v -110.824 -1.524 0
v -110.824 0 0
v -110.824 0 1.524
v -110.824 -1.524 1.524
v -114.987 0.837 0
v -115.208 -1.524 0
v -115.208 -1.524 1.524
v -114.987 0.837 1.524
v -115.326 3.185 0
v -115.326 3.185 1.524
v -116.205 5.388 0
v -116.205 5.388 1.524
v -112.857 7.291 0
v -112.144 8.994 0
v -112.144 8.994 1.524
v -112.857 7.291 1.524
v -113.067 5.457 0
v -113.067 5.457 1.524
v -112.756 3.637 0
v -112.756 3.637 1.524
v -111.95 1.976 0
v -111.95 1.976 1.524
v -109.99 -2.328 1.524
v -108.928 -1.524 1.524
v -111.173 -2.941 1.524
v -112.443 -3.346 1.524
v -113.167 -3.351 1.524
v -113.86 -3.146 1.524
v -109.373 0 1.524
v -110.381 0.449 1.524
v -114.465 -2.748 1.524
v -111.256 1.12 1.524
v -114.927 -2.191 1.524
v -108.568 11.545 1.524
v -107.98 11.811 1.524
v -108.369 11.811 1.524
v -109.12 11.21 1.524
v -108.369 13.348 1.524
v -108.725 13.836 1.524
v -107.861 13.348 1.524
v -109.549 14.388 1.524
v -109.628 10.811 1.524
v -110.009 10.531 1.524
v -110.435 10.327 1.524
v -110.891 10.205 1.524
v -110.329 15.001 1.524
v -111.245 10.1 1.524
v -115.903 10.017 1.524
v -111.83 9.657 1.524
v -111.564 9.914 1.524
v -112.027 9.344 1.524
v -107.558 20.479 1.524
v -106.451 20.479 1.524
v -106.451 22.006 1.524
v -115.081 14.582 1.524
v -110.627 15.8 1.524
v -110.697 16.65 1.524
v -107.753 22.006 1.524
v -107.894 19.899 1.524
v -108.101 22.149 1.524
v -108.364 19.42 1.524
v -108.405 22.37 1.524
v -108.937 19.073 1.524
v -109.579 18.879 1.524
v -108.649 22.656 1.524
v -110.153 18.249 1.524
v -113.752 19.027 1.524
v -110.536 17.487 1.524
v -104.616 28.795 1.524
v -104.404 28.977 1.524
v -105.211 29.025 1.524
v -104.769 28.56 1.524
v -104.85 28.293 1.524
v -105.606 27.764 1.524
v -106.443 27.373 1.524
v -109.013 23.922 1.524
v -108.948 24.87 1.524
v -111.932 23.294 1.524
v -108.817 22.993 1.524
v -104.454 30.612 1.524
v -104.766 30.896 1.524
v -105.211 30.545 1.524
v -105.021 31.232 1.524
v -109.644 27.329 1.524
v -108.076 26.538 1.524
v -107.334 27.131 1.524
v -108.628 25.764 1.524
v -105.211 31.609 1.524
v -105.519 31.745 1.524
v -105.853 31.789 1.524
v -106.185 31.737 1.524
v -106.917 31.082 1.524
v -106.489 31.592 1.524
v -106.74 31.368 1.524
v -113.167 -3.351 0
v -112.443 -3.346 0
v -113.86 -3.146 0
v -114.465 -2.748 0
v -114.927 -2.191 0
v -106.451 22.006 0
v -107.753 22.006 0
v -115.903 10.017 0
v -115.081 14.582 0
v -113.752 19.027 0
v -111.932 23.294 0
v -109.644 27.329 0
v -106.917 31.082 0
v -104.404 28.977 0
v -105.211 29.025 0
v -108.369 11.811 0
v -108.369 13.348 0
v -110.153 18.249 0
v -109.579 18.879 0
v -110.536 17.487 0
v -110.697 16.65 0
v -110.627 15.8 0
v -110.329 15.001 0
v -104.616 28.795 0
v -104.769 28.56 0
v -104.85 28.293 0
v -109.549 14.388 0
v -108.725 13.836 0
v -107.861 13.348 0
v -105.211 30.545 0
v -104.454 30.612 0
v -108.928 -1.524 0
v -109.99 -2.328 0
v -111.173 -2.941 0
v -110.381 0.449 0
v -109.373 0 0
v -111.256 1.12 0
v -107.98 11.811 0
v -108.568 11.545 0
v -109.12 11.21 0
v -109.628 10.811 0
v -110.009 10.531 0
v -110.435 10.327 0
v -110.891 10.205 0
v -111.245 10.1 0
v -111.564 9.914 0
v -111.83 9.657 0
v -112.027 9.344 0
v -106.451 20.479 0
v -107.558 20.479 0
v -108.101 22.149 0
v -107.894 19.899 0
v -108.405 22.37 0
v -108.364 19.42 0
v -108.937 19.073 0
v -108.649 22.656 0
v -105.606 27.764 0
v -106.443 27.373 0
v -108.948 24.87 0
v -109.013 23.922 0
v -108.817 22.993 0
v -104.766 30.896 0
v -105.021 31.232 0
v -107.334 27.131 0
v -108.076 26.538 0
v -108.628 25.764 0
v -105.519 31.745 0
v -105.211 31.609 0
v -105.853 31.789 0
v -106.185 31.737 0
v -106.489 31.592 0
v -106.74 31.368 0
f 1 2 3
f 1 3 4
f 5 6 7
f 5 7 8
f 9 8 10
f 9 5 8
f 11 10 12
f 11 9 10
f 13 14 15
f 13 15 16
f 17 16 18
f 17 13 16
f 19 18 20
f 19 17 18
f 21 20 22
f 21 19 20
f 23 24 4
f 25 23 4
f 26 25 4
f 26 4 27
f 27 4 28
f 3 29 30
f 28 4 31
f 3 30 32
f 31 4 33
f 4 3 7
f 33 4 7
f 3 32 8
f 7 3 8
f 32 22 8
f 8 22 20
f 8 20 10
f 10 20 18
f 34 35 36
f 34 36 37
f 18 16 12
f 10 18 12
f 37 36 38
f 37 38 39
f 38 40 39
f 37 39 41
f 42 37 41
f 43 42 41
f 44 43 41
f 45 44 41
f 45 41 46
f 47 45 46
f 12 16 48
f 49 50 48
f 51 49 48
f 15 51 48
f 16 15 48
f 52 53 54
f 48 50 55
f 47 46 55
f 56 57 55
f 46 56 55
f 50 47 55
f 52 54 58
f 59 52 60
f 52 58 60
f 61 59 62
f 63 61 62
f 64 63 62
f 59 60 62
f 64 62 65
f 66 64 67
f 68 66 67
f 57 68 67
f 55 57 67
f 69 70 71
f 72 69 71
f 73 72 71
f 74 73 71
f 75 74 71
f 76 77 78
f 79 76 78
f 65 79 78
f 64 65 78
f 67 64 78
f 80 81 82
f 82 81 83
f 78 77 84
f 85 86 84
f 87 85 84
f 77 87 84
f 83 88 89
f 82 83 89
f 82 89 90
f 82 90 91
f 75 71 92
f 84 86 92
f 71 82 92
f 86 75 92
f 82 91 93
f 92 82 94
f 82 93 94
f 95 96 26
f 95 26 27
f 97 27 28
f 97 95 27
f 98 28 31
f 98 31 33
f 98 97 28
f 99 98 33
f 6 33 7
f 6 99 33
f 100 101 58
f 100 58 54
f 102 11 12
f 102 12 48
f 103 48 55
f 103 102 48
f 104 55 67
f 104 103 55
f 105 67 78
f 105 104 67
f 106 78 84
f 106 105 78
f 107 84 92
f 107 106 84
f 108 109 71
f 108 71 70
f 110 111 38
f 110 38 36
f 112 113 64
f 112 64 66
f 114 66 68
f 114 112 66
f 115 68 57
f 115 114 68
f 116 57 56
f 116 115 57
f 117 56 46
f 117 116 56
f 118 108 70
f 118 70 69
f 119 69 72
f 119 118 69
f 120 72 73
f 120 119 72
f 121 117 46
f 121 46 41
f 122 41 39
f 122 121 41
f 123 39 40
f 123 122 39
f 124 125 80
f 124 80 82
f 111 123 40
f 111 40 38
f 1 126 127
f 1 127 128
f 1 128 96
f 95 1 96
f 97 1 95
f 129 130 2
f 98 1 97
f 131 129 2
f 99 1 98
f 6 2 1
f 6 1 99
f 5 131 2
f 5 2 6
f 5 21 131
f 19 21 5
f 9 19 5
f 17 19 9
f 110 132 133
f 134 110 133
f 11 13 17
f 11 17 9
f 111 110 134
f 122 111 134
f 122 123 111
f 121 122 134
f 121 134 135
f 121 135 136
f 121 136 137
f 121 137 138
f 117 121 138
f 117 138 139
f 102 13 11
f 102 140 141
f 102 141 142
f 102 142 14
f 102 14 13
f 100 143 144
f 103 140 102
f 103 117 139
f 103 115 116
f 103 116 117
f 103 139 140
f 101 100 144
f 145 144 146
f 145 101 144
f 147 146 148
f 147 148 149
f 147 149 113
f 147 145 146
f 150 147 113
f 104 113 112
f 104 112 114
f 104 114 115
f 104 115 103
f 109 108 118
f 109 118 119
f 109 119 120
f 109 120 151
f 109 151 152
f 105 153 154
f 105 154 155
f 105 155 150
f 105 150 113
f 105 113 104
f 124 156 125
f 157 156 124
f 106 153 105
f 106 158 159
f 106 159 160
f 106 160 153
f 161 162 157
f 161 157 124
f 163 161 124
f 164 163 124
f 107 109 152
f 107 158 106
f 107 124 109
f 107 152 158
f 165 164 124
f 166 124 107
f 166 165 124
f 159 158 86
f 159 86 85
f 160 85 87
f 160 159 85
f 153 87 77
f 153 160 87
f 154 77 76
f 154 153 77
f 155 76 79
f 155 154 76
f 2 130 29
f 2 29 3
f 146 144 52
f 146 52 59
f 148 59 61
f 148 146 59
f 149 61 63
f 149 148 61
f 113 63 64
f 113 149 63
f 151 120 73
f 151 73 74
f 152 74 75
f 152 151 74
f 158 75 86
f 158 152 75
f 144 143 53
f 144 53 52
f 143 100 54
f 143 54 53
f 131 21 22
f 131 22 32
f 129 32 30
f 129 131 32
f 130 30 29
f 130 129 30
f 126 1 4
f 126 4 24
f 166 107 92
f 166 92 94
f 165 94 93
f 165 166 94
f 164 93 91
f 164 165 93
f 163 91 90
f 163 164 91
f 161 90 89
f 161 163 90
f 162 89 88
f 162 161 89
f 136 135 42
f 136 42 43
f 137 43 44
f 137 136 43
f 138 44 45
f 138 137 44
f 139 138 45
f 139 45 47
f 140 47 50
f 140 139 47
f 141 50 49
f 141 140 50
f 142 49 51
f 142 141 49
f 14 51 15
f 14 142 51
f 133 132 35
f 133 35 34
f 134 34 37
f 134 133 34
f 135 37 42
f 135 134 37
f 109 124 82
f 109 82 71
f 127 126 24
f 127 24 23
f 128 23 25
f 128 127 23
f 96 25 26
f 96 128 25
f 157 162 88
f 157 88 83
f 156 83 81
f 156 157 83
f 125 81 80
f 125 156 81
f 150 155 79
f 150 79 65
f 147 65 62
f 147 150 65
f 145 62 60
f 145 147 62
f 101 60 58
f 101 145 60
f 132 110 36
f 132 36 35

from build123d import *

# Parameters (mm, degrees)
BOSS_EXTRUDE1_DEPTH = 1.524


with BuildPart() as part:
    # Sketch1 → Boss-Extrude1 (new body)
    with BuildSketch(Plane.XY):
        with BuildLine():
            Line((-110.824360774, 0), (-110.824360774, -1.524))
            Line((-110.824360774, -1.524), (-108.927743626, -1.524))
            ThreePointArc((-108.927743626, -1.524), (-110.568786986, -2.659932295), (-112.442883949, -3.346318527))
            ThreePointArc((-112.442883949, -3.346318527), (-114.17716098, -2.968961004), (-115.207793415, -1.524))
            ThreePointArc((-115.207793415, -1.524), (-115.087103351, 2.021162801), (-116.205341733, 5.387509232))
            ThreePointArc((-116.205341733, 5.387509232), (-113.752453245, 19.026762394), (-106.916865485, 31.081663004))
            ThreePointArc((-106.916865485, 31.081663004), (-106.184950927, 31.736506317), (-105.211200263, 31.608723968))
            ThreePointArc((-105.211200263, 31.608723968), (-104.901513118, 31.0579276), (-104.454303839, 30.611512291))
            Line((-104.454303839, 30.611512291), (-105.211200263, 30.544825407))
            Line((-105.211200263, 30.544825407), (-105.211200263, 29.025368505))
            Line((-105.211200263, 29.025368505), (-104.403994808, 28.977437337))
            ThreePointArc((-104.403994808, 28.977437337), (-104.700603167, 28.683060455), (-104.849681876, 28.292663471))
            ThreePointArc((-104.849681876, 28.292663471), (-106.016123504, 27.550057971), (-107.333979522, 27.131364149))
            ThreePointArc((-107.333979522, 27.131364149), (-108.818673483, 25.32832607), (-108.817338403, 22.992676119))
            ThreePointArc((-108.817338403, 22.992676119), (-108.405188947, 22.369705182), (-107.752531072, 22.00639036))
            Line((-107.752531072, 22.00639036), (-106.451038151, 22.00639036))
            Line((-106.451038151, 22.00639036), (-106.451038151, 20.478701595))
            Line((-106.451038151, 20.478701595), (-107.557691458, 20.478701595))
            ThreePointArc((-107.557691458, 20.478701595), (-108.363599409, 19.419942847), (-109.579185571, 18.87882549))
            ThreePointArc((-109.579185571, 18.87882549), (-110.645223511, 17.073742216), (-110.328866367, 15.001381081))
            ThreePointArc((-110.328866367, 15.001381081), (-109.142498989, 14.103916539), (-107.861232511, 13.348094888))
            Line((-107.861232511, 13.348094888), (-108.369232511, 13.348094888))
            Line((-108.369232511, 13.348094888), (-108.369232511, 11.811176348))
            Line((-108.369232511, 11.811176348), (-107.979675981, 11.811176348))
            ThreePointArc((-107.979675981, 11.811176348), (-108.849411149, 11.386044546), (-109.628173595, 10.810974668))
            ThreePointArc((-109.628173595, 10.810974668), (-110.216954925, 10.419220775), (-110.890927129, 10.204987173))
            ThreePointArc((-110.890927129, 10.204987173), (-111.704771273, 9.793399538), (-112.1438695, 8.994062677))
            ThreePointArc((-112.1438695, 8.994062677), (-113.066844869, 5.45696931), (-111.950245848, 1.976147619))
            ThreePointArc((-111.950245848, 1.976147619), (-110.838027473, 0.758299628), (-109.373389254, 0))
            Line((-109.373389254, 0), (-110.824360774, 0))
        make_face()
    extrude(amount=BOSS_EXTRUDE1_DEPTH)


solid = part.part
